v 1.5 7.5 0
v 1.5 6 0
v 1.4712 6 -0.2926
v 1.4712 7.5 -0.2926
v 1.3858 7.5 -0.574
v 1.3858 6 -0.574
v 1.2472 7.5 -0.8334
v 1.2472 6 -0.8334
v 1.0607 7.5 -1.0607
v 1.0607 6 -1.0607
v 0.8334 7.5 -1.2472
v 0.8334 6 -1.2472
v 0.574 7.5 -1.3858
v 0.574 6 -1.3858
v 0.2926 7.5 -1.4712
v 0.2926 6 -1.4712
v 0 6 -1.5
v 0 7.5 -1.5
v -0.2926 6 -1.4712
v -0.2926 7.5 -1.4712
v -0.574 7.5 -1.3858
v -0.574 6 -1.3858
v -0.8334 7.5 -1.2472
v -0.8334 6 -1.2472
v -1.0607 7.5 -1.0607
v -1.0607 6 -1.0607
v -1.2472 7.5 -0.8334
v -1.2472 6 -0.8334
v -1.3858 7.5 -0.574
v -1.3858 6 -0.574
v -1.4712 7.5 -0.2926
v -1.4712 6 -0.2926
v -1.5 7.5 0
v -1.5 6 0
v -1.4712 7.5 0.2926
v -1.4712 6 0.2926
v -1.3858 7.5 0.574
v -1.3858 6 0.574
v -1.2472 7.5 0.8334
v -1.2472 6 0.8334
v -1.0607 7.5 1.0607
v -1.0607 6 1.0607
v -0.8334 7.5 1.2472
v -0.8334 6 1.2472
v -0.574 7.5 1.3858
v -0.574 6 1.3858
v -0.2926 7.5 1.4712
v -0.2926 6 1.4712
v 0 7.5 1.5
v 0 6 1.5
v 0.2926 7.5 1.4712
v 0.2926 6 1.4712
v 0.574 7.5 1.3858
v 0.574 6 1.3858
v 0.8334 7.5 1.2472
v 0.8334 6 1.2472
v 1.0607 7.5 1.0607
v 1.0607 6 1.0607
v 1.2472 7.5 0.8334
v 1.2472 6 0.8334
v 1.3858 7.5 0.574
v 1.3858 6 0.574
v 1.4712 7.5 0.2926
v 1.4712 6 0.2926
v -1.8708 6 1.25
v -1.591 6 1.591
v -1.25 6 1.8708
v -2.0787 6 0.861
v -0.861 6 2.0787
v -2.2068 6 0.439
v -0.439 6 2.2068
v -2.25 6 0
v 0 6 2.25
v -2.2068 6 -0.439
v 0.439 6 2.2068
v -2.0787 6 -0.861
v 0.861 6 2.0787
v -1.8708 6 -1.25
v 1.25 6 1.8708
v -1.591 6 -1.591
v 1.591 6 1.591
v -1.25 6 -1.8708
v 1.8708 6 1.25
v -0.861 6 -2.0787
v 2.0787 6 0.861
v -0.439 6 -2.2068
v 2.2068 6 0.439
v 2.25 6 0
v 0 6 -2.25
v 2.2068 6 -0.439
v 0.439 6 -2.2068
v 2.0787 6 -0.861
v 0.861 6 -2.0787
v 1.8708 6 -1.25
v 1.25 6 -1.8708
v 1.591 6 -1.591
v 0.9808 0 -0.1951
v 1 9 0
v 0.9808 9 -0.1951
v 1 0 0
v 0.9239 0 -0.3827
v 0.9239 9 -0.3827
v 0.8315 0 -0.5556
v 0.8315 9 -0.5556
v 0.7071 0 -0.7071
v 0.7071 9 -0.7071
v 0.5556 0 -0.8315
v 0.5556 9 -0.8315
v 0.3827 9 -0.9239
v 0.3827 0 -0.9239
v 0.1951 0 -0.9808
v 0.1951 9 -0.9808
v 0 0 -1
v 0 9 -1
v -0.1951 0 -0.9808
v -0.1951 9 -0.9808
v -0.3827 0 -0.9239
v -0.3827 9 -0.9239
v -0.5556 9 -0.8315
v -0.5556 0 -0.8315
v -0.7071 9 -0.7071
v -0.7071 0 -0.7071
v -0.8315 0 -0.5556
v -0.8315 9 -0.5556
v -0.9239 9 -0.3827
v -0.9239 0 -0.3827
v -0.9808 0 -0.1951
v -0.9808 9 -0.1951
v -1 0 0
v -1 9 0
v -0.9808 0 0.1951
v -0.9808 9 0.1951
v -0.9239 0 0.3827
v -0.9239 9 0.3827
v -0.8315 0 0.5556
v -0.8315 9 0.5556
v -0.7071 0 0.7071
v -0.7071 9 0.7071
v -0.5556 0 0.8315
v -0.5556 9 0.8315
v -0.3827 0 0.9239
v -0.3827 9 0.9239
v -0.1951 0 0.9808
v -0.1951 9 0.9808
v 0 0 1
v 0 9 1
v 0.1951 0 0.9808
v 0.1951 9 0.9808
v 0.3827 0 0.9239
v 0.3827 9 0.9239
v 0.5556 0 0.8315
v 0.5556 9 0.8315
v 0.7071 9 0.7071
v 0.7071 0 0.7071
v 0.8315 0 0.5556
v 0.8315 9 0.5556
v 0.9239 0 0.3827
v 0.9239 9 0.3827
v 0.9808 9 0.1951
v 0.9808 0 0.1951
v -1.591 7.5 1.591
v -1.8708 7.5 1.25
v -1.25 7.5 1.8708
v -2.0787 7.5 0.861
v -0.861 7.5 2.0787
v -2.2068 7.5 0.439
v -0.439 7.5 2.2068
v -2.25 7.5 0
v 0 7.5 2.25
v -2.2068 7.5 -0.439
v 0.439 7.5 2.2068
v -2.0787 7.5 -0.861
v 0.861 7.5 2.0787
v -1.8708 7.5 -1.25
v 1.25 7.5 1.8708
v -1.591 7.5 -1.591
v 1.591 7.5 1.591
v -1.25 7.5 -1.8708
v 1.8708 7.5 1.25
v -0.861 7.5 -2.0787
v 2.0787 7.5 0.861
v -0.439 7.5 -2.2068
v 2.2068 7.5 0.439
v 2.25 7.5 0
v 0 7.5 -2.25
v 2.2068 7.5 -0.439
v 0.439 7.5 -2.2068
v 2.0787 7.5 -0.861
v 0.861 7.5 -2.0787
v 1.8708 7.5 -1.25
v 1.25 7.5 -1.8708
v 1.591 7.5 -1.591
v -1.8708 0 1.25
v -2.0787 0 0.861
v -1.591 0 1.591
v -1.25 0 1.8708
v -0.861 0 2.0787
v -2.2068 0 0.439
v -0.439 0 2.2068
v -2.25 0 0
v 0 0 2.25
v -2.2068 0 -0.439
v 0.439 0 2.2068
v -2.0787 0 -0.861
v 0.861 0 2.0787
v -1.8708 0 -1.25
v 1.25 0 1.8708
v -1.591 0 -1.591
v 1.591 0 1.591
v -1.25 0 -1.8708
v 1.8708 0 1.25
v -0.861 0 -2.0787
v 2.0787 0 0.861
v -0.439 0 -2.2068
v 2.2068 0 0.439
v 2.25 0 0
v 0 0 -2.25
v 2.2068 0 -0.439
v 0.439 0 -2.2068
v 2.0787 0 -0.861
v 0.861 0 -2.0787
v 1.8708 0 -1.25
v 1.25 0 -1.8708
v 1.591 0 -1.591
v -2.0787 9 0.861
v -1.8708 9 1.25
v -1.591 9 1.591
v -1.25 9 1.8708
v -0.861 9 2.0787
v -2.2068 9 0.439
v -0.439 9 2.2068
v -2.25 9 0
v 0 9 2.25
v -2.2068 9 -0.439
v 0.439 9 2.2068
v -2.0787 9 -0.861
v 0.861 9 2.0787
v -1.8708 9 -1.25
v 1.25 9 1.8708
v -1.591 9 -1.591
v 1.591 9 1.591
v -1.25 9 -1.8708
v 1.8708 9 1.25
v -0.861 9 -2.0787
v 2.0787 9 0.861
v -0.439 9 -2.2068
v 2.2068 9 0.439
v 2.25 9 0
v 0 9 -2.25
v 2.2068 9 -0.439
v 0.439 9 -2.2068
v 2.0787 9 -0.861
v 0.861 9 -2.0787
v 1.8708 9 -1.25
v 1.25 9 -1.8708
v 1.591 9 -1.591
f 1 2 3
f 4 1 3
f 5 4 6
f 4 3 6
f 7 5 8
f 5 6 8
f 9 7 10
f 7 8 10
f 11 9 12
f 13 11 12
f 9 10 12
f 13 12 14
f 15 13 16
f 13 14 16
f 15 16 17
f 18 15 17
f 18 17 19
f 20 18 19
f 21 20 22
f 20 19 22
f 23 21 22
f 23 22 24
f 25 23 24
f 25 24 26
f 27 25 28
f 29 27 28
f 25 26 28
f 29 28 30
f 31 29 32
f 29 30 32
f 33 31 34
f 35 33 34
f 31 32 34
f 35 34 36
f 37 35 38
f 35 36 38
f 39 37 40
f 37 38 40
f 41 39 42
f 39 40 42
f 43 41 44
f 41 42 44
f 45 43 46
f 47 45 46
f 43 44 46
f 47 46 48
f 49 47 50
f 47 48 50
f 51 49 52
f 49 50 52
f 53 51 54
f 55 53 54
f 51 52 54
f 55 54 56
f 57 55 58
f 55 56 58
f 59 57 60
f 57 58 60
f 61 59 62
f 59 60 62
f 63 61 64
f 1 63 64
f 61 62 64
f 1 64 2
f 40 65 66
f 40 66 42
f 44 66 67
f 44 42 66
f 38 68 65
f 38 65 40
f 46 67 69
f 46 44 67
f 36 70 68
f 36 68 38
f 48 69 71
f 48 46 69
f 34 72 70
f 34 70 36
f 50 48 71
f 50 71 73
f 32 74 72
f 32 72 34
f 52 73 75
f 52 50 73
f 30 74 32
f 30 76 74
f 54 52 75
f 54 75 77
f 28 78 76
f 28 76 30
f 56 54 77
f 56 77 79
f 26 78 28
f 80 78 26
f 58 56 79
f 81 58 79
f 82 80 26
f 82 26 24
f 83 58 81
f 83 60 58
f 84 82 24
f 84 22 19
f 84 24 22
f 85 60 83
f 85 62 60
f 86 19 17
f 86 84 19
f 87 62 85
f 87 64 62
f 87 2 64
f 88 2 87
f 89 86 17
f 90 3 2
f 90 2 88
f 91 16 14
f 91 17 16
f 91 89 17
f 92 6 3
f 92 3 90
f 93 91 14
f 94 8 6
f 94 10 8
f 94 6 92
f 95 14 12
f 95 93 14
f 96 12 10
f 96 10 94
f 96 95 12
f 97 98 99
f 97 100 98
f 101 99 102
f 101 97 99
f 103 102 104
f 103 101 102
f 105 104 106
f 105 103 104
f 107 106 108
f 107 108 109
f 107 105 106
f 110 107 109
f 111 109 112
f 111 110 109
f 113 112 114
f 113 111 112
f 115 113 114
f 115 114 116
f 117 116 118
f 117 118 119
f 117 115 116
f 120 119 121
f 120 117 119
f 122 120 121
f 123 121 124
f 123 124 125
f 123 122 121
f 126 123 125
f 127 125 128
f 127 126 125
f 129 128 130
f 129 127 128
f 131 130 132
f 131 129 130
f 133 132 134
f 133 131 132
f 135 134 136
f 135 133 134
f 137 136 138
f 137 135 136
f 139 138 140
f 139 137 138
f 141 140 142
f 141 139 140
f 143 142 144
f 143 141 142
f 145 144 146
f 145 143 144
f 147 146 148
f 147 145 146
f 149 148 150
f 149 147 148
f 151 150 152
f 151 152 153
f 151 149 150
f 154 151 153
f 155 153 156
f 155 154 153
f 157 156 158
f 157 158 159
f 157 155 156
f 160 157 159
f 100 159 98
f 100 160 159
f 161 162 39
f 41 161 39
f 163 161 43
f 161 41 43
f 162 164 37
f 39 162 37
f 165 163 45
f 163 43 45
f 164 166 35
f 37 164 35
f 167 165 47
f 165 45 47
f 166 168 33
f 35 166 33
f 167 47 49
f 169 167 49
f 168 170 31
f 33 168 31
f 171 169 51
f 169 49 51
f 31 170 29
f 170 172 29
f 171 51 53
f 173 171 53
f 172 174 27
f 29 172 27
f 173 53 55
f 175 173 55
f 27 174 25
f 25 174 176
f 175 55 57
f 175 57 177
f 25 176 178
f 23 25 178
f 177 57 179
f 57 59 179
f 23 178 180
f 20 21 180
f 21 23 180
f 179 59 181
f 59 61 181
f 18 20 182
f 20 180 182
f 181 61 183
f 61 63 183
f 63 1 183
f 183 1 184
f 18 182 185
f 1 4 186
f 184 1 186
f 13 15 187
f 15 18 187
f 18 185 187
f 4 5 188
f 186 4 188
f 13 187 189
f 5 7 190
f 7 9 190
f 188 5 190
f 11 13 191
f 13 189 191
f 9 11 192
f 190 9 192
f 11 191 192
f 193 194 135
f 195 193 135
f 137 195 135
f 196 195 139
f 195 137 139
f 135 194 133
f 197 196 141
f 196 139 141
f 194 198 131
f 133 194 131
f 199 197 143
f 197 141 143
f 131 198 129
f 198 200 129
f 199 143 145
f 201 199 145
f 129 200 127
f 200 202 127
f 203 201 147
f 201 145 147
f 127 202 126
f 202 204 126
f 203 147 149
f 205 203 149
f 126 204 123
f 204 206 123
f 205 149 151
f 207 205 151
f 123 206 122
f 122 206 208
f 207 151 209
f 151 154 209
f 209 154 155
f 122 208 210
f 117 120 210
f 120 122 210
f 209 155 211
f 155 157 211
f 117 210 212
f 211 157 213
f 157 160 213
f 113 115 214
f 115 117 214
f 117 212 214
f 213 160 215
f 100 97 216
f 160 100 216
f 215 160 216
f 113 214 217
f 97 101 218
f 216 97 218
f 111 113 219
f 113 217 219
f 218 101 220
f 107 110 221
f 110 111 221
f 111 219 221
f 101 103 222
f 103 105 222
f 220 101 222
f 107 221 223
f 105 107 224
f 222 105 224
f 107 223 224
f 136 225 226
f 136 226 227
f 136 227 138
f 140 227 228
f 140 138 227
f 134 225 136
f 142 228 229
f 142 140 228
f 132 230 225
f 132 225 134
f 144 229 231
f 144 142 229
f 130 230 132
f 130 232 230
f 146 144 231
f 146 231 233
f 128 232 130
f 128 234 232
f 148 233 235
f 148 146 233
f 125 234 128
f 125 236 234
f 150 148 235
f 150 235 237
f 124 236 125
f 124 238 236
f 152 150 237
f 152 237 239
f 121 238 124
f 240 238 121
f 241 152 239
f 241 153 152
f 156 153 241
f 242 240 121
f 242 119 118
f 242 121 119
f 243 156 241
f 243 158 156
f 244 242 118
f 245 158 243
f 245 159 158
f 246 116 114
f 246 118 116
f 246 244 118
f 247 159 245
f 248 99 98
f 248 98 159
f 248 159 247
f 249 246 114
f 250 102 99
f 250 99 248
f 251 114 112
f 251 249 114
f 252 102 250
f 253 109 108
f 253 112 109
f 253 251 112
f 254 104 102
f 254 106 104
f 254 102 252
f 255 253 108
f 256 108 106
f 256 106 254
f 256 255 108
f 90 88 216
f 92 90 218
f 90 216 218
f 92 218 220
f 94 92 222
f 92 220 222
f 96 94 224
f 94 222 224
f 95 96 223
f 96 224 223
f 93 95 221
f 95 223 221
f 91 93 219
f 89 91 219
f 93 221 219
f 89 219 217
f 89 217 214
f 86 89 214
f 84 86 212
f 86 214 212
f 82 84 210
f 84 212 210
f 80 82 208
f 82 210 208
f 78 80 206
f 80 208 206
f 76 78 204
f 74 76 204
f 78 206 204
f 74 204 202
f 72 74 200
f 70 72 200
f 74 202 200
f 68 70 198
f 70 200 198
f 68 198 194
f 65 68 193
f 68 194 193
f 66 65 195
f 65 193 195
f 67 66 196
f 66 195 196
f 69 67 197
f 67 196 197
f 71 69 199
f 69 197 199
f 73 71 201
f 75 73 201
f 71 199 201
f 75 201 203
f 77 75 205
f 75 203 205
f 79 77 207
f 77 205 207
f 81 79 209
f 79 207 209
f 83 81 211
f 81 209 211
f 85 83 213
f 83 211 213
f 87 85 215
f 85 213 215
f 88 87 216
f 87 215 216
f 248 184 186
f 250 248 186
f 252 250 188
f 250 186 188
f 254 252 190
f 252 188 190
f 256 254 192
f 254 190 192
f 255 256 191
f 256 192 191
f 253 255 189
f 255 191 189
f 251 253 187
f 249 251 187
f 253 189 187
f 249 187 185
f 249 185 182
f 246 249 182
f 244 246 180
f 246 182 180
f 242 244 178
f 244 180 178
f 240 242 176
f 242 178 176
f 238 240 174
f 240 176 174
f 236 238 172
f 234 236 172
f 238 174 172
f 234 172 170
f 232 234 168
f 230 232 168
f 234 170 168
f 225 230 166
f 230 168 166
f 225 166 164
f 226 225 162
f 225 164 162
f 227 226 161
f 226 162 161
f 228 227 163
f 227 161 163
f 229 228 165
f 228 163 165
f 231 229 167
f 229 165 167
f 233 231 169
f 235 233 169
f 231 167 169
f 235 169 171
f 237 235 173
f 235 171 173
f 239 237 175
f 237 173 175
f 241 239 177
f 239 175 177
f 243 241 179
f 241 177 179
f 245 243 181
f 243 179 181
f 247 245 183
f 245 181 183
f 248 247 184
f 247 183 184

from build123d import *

# Parameters (mm, degrees)
SKETCH1_R           = 2.25
SKETCH1_R_2         = 1
BOSS_EXTRUDE1_DEPTH = 6
SKETCH2_R           = 1.5
SKETCH2_R_2         = 1
BOSS_EXTRUDE2_DEPTH = 1.5
SKETCH3_R           = 2.25
SKETCH3_R_2         = 1
BOSS_EXTRUDE3_DEPTH = 1.5


with BuildPart() as part:
    # Sketch1 → Boss-Extrude1 (new body)
    with BuildSketch(Plane(origin=(0, 0, 0), x_dir=(1, 0, 0), z_dir=(0, 1, 0))):
        Circle(SKETCH1_R)
        Circle(SKETCH1_R_2, mode=Mode.SUBTRACT)
    extrude(amount=BOSS_EXTRUDE1_DEPTH)

    # Sketch2 → Boss-Extrude2 (add)
    with BuildSketch(Plane(origin=(0, 6, 0), x_dir=(1, 0, 0), z_dir=(0, 1, 0))):
        Circle(SKETCH2_R)
        Circle(SKETCH2_R_2, mode=Mode.SUBTRACT)
    extrude(amount=BOSS_EXTRUDE2_DEPTH)

    # Sketch3 → Boss-Extrude3 (add)
    with BuildSketch(Plane(origin=(0, 7.5, 0), x_dir=(1, 0, 0), z_dir=(0, 1, 0))):
        Circle(SKETCH3_R)
        Circle(SKETCH3_R_2, mode=Mode.SUBTRACT)
    extrude(amount=BOSS_EXTRUDE3_DEPTH)


solid = part.part
